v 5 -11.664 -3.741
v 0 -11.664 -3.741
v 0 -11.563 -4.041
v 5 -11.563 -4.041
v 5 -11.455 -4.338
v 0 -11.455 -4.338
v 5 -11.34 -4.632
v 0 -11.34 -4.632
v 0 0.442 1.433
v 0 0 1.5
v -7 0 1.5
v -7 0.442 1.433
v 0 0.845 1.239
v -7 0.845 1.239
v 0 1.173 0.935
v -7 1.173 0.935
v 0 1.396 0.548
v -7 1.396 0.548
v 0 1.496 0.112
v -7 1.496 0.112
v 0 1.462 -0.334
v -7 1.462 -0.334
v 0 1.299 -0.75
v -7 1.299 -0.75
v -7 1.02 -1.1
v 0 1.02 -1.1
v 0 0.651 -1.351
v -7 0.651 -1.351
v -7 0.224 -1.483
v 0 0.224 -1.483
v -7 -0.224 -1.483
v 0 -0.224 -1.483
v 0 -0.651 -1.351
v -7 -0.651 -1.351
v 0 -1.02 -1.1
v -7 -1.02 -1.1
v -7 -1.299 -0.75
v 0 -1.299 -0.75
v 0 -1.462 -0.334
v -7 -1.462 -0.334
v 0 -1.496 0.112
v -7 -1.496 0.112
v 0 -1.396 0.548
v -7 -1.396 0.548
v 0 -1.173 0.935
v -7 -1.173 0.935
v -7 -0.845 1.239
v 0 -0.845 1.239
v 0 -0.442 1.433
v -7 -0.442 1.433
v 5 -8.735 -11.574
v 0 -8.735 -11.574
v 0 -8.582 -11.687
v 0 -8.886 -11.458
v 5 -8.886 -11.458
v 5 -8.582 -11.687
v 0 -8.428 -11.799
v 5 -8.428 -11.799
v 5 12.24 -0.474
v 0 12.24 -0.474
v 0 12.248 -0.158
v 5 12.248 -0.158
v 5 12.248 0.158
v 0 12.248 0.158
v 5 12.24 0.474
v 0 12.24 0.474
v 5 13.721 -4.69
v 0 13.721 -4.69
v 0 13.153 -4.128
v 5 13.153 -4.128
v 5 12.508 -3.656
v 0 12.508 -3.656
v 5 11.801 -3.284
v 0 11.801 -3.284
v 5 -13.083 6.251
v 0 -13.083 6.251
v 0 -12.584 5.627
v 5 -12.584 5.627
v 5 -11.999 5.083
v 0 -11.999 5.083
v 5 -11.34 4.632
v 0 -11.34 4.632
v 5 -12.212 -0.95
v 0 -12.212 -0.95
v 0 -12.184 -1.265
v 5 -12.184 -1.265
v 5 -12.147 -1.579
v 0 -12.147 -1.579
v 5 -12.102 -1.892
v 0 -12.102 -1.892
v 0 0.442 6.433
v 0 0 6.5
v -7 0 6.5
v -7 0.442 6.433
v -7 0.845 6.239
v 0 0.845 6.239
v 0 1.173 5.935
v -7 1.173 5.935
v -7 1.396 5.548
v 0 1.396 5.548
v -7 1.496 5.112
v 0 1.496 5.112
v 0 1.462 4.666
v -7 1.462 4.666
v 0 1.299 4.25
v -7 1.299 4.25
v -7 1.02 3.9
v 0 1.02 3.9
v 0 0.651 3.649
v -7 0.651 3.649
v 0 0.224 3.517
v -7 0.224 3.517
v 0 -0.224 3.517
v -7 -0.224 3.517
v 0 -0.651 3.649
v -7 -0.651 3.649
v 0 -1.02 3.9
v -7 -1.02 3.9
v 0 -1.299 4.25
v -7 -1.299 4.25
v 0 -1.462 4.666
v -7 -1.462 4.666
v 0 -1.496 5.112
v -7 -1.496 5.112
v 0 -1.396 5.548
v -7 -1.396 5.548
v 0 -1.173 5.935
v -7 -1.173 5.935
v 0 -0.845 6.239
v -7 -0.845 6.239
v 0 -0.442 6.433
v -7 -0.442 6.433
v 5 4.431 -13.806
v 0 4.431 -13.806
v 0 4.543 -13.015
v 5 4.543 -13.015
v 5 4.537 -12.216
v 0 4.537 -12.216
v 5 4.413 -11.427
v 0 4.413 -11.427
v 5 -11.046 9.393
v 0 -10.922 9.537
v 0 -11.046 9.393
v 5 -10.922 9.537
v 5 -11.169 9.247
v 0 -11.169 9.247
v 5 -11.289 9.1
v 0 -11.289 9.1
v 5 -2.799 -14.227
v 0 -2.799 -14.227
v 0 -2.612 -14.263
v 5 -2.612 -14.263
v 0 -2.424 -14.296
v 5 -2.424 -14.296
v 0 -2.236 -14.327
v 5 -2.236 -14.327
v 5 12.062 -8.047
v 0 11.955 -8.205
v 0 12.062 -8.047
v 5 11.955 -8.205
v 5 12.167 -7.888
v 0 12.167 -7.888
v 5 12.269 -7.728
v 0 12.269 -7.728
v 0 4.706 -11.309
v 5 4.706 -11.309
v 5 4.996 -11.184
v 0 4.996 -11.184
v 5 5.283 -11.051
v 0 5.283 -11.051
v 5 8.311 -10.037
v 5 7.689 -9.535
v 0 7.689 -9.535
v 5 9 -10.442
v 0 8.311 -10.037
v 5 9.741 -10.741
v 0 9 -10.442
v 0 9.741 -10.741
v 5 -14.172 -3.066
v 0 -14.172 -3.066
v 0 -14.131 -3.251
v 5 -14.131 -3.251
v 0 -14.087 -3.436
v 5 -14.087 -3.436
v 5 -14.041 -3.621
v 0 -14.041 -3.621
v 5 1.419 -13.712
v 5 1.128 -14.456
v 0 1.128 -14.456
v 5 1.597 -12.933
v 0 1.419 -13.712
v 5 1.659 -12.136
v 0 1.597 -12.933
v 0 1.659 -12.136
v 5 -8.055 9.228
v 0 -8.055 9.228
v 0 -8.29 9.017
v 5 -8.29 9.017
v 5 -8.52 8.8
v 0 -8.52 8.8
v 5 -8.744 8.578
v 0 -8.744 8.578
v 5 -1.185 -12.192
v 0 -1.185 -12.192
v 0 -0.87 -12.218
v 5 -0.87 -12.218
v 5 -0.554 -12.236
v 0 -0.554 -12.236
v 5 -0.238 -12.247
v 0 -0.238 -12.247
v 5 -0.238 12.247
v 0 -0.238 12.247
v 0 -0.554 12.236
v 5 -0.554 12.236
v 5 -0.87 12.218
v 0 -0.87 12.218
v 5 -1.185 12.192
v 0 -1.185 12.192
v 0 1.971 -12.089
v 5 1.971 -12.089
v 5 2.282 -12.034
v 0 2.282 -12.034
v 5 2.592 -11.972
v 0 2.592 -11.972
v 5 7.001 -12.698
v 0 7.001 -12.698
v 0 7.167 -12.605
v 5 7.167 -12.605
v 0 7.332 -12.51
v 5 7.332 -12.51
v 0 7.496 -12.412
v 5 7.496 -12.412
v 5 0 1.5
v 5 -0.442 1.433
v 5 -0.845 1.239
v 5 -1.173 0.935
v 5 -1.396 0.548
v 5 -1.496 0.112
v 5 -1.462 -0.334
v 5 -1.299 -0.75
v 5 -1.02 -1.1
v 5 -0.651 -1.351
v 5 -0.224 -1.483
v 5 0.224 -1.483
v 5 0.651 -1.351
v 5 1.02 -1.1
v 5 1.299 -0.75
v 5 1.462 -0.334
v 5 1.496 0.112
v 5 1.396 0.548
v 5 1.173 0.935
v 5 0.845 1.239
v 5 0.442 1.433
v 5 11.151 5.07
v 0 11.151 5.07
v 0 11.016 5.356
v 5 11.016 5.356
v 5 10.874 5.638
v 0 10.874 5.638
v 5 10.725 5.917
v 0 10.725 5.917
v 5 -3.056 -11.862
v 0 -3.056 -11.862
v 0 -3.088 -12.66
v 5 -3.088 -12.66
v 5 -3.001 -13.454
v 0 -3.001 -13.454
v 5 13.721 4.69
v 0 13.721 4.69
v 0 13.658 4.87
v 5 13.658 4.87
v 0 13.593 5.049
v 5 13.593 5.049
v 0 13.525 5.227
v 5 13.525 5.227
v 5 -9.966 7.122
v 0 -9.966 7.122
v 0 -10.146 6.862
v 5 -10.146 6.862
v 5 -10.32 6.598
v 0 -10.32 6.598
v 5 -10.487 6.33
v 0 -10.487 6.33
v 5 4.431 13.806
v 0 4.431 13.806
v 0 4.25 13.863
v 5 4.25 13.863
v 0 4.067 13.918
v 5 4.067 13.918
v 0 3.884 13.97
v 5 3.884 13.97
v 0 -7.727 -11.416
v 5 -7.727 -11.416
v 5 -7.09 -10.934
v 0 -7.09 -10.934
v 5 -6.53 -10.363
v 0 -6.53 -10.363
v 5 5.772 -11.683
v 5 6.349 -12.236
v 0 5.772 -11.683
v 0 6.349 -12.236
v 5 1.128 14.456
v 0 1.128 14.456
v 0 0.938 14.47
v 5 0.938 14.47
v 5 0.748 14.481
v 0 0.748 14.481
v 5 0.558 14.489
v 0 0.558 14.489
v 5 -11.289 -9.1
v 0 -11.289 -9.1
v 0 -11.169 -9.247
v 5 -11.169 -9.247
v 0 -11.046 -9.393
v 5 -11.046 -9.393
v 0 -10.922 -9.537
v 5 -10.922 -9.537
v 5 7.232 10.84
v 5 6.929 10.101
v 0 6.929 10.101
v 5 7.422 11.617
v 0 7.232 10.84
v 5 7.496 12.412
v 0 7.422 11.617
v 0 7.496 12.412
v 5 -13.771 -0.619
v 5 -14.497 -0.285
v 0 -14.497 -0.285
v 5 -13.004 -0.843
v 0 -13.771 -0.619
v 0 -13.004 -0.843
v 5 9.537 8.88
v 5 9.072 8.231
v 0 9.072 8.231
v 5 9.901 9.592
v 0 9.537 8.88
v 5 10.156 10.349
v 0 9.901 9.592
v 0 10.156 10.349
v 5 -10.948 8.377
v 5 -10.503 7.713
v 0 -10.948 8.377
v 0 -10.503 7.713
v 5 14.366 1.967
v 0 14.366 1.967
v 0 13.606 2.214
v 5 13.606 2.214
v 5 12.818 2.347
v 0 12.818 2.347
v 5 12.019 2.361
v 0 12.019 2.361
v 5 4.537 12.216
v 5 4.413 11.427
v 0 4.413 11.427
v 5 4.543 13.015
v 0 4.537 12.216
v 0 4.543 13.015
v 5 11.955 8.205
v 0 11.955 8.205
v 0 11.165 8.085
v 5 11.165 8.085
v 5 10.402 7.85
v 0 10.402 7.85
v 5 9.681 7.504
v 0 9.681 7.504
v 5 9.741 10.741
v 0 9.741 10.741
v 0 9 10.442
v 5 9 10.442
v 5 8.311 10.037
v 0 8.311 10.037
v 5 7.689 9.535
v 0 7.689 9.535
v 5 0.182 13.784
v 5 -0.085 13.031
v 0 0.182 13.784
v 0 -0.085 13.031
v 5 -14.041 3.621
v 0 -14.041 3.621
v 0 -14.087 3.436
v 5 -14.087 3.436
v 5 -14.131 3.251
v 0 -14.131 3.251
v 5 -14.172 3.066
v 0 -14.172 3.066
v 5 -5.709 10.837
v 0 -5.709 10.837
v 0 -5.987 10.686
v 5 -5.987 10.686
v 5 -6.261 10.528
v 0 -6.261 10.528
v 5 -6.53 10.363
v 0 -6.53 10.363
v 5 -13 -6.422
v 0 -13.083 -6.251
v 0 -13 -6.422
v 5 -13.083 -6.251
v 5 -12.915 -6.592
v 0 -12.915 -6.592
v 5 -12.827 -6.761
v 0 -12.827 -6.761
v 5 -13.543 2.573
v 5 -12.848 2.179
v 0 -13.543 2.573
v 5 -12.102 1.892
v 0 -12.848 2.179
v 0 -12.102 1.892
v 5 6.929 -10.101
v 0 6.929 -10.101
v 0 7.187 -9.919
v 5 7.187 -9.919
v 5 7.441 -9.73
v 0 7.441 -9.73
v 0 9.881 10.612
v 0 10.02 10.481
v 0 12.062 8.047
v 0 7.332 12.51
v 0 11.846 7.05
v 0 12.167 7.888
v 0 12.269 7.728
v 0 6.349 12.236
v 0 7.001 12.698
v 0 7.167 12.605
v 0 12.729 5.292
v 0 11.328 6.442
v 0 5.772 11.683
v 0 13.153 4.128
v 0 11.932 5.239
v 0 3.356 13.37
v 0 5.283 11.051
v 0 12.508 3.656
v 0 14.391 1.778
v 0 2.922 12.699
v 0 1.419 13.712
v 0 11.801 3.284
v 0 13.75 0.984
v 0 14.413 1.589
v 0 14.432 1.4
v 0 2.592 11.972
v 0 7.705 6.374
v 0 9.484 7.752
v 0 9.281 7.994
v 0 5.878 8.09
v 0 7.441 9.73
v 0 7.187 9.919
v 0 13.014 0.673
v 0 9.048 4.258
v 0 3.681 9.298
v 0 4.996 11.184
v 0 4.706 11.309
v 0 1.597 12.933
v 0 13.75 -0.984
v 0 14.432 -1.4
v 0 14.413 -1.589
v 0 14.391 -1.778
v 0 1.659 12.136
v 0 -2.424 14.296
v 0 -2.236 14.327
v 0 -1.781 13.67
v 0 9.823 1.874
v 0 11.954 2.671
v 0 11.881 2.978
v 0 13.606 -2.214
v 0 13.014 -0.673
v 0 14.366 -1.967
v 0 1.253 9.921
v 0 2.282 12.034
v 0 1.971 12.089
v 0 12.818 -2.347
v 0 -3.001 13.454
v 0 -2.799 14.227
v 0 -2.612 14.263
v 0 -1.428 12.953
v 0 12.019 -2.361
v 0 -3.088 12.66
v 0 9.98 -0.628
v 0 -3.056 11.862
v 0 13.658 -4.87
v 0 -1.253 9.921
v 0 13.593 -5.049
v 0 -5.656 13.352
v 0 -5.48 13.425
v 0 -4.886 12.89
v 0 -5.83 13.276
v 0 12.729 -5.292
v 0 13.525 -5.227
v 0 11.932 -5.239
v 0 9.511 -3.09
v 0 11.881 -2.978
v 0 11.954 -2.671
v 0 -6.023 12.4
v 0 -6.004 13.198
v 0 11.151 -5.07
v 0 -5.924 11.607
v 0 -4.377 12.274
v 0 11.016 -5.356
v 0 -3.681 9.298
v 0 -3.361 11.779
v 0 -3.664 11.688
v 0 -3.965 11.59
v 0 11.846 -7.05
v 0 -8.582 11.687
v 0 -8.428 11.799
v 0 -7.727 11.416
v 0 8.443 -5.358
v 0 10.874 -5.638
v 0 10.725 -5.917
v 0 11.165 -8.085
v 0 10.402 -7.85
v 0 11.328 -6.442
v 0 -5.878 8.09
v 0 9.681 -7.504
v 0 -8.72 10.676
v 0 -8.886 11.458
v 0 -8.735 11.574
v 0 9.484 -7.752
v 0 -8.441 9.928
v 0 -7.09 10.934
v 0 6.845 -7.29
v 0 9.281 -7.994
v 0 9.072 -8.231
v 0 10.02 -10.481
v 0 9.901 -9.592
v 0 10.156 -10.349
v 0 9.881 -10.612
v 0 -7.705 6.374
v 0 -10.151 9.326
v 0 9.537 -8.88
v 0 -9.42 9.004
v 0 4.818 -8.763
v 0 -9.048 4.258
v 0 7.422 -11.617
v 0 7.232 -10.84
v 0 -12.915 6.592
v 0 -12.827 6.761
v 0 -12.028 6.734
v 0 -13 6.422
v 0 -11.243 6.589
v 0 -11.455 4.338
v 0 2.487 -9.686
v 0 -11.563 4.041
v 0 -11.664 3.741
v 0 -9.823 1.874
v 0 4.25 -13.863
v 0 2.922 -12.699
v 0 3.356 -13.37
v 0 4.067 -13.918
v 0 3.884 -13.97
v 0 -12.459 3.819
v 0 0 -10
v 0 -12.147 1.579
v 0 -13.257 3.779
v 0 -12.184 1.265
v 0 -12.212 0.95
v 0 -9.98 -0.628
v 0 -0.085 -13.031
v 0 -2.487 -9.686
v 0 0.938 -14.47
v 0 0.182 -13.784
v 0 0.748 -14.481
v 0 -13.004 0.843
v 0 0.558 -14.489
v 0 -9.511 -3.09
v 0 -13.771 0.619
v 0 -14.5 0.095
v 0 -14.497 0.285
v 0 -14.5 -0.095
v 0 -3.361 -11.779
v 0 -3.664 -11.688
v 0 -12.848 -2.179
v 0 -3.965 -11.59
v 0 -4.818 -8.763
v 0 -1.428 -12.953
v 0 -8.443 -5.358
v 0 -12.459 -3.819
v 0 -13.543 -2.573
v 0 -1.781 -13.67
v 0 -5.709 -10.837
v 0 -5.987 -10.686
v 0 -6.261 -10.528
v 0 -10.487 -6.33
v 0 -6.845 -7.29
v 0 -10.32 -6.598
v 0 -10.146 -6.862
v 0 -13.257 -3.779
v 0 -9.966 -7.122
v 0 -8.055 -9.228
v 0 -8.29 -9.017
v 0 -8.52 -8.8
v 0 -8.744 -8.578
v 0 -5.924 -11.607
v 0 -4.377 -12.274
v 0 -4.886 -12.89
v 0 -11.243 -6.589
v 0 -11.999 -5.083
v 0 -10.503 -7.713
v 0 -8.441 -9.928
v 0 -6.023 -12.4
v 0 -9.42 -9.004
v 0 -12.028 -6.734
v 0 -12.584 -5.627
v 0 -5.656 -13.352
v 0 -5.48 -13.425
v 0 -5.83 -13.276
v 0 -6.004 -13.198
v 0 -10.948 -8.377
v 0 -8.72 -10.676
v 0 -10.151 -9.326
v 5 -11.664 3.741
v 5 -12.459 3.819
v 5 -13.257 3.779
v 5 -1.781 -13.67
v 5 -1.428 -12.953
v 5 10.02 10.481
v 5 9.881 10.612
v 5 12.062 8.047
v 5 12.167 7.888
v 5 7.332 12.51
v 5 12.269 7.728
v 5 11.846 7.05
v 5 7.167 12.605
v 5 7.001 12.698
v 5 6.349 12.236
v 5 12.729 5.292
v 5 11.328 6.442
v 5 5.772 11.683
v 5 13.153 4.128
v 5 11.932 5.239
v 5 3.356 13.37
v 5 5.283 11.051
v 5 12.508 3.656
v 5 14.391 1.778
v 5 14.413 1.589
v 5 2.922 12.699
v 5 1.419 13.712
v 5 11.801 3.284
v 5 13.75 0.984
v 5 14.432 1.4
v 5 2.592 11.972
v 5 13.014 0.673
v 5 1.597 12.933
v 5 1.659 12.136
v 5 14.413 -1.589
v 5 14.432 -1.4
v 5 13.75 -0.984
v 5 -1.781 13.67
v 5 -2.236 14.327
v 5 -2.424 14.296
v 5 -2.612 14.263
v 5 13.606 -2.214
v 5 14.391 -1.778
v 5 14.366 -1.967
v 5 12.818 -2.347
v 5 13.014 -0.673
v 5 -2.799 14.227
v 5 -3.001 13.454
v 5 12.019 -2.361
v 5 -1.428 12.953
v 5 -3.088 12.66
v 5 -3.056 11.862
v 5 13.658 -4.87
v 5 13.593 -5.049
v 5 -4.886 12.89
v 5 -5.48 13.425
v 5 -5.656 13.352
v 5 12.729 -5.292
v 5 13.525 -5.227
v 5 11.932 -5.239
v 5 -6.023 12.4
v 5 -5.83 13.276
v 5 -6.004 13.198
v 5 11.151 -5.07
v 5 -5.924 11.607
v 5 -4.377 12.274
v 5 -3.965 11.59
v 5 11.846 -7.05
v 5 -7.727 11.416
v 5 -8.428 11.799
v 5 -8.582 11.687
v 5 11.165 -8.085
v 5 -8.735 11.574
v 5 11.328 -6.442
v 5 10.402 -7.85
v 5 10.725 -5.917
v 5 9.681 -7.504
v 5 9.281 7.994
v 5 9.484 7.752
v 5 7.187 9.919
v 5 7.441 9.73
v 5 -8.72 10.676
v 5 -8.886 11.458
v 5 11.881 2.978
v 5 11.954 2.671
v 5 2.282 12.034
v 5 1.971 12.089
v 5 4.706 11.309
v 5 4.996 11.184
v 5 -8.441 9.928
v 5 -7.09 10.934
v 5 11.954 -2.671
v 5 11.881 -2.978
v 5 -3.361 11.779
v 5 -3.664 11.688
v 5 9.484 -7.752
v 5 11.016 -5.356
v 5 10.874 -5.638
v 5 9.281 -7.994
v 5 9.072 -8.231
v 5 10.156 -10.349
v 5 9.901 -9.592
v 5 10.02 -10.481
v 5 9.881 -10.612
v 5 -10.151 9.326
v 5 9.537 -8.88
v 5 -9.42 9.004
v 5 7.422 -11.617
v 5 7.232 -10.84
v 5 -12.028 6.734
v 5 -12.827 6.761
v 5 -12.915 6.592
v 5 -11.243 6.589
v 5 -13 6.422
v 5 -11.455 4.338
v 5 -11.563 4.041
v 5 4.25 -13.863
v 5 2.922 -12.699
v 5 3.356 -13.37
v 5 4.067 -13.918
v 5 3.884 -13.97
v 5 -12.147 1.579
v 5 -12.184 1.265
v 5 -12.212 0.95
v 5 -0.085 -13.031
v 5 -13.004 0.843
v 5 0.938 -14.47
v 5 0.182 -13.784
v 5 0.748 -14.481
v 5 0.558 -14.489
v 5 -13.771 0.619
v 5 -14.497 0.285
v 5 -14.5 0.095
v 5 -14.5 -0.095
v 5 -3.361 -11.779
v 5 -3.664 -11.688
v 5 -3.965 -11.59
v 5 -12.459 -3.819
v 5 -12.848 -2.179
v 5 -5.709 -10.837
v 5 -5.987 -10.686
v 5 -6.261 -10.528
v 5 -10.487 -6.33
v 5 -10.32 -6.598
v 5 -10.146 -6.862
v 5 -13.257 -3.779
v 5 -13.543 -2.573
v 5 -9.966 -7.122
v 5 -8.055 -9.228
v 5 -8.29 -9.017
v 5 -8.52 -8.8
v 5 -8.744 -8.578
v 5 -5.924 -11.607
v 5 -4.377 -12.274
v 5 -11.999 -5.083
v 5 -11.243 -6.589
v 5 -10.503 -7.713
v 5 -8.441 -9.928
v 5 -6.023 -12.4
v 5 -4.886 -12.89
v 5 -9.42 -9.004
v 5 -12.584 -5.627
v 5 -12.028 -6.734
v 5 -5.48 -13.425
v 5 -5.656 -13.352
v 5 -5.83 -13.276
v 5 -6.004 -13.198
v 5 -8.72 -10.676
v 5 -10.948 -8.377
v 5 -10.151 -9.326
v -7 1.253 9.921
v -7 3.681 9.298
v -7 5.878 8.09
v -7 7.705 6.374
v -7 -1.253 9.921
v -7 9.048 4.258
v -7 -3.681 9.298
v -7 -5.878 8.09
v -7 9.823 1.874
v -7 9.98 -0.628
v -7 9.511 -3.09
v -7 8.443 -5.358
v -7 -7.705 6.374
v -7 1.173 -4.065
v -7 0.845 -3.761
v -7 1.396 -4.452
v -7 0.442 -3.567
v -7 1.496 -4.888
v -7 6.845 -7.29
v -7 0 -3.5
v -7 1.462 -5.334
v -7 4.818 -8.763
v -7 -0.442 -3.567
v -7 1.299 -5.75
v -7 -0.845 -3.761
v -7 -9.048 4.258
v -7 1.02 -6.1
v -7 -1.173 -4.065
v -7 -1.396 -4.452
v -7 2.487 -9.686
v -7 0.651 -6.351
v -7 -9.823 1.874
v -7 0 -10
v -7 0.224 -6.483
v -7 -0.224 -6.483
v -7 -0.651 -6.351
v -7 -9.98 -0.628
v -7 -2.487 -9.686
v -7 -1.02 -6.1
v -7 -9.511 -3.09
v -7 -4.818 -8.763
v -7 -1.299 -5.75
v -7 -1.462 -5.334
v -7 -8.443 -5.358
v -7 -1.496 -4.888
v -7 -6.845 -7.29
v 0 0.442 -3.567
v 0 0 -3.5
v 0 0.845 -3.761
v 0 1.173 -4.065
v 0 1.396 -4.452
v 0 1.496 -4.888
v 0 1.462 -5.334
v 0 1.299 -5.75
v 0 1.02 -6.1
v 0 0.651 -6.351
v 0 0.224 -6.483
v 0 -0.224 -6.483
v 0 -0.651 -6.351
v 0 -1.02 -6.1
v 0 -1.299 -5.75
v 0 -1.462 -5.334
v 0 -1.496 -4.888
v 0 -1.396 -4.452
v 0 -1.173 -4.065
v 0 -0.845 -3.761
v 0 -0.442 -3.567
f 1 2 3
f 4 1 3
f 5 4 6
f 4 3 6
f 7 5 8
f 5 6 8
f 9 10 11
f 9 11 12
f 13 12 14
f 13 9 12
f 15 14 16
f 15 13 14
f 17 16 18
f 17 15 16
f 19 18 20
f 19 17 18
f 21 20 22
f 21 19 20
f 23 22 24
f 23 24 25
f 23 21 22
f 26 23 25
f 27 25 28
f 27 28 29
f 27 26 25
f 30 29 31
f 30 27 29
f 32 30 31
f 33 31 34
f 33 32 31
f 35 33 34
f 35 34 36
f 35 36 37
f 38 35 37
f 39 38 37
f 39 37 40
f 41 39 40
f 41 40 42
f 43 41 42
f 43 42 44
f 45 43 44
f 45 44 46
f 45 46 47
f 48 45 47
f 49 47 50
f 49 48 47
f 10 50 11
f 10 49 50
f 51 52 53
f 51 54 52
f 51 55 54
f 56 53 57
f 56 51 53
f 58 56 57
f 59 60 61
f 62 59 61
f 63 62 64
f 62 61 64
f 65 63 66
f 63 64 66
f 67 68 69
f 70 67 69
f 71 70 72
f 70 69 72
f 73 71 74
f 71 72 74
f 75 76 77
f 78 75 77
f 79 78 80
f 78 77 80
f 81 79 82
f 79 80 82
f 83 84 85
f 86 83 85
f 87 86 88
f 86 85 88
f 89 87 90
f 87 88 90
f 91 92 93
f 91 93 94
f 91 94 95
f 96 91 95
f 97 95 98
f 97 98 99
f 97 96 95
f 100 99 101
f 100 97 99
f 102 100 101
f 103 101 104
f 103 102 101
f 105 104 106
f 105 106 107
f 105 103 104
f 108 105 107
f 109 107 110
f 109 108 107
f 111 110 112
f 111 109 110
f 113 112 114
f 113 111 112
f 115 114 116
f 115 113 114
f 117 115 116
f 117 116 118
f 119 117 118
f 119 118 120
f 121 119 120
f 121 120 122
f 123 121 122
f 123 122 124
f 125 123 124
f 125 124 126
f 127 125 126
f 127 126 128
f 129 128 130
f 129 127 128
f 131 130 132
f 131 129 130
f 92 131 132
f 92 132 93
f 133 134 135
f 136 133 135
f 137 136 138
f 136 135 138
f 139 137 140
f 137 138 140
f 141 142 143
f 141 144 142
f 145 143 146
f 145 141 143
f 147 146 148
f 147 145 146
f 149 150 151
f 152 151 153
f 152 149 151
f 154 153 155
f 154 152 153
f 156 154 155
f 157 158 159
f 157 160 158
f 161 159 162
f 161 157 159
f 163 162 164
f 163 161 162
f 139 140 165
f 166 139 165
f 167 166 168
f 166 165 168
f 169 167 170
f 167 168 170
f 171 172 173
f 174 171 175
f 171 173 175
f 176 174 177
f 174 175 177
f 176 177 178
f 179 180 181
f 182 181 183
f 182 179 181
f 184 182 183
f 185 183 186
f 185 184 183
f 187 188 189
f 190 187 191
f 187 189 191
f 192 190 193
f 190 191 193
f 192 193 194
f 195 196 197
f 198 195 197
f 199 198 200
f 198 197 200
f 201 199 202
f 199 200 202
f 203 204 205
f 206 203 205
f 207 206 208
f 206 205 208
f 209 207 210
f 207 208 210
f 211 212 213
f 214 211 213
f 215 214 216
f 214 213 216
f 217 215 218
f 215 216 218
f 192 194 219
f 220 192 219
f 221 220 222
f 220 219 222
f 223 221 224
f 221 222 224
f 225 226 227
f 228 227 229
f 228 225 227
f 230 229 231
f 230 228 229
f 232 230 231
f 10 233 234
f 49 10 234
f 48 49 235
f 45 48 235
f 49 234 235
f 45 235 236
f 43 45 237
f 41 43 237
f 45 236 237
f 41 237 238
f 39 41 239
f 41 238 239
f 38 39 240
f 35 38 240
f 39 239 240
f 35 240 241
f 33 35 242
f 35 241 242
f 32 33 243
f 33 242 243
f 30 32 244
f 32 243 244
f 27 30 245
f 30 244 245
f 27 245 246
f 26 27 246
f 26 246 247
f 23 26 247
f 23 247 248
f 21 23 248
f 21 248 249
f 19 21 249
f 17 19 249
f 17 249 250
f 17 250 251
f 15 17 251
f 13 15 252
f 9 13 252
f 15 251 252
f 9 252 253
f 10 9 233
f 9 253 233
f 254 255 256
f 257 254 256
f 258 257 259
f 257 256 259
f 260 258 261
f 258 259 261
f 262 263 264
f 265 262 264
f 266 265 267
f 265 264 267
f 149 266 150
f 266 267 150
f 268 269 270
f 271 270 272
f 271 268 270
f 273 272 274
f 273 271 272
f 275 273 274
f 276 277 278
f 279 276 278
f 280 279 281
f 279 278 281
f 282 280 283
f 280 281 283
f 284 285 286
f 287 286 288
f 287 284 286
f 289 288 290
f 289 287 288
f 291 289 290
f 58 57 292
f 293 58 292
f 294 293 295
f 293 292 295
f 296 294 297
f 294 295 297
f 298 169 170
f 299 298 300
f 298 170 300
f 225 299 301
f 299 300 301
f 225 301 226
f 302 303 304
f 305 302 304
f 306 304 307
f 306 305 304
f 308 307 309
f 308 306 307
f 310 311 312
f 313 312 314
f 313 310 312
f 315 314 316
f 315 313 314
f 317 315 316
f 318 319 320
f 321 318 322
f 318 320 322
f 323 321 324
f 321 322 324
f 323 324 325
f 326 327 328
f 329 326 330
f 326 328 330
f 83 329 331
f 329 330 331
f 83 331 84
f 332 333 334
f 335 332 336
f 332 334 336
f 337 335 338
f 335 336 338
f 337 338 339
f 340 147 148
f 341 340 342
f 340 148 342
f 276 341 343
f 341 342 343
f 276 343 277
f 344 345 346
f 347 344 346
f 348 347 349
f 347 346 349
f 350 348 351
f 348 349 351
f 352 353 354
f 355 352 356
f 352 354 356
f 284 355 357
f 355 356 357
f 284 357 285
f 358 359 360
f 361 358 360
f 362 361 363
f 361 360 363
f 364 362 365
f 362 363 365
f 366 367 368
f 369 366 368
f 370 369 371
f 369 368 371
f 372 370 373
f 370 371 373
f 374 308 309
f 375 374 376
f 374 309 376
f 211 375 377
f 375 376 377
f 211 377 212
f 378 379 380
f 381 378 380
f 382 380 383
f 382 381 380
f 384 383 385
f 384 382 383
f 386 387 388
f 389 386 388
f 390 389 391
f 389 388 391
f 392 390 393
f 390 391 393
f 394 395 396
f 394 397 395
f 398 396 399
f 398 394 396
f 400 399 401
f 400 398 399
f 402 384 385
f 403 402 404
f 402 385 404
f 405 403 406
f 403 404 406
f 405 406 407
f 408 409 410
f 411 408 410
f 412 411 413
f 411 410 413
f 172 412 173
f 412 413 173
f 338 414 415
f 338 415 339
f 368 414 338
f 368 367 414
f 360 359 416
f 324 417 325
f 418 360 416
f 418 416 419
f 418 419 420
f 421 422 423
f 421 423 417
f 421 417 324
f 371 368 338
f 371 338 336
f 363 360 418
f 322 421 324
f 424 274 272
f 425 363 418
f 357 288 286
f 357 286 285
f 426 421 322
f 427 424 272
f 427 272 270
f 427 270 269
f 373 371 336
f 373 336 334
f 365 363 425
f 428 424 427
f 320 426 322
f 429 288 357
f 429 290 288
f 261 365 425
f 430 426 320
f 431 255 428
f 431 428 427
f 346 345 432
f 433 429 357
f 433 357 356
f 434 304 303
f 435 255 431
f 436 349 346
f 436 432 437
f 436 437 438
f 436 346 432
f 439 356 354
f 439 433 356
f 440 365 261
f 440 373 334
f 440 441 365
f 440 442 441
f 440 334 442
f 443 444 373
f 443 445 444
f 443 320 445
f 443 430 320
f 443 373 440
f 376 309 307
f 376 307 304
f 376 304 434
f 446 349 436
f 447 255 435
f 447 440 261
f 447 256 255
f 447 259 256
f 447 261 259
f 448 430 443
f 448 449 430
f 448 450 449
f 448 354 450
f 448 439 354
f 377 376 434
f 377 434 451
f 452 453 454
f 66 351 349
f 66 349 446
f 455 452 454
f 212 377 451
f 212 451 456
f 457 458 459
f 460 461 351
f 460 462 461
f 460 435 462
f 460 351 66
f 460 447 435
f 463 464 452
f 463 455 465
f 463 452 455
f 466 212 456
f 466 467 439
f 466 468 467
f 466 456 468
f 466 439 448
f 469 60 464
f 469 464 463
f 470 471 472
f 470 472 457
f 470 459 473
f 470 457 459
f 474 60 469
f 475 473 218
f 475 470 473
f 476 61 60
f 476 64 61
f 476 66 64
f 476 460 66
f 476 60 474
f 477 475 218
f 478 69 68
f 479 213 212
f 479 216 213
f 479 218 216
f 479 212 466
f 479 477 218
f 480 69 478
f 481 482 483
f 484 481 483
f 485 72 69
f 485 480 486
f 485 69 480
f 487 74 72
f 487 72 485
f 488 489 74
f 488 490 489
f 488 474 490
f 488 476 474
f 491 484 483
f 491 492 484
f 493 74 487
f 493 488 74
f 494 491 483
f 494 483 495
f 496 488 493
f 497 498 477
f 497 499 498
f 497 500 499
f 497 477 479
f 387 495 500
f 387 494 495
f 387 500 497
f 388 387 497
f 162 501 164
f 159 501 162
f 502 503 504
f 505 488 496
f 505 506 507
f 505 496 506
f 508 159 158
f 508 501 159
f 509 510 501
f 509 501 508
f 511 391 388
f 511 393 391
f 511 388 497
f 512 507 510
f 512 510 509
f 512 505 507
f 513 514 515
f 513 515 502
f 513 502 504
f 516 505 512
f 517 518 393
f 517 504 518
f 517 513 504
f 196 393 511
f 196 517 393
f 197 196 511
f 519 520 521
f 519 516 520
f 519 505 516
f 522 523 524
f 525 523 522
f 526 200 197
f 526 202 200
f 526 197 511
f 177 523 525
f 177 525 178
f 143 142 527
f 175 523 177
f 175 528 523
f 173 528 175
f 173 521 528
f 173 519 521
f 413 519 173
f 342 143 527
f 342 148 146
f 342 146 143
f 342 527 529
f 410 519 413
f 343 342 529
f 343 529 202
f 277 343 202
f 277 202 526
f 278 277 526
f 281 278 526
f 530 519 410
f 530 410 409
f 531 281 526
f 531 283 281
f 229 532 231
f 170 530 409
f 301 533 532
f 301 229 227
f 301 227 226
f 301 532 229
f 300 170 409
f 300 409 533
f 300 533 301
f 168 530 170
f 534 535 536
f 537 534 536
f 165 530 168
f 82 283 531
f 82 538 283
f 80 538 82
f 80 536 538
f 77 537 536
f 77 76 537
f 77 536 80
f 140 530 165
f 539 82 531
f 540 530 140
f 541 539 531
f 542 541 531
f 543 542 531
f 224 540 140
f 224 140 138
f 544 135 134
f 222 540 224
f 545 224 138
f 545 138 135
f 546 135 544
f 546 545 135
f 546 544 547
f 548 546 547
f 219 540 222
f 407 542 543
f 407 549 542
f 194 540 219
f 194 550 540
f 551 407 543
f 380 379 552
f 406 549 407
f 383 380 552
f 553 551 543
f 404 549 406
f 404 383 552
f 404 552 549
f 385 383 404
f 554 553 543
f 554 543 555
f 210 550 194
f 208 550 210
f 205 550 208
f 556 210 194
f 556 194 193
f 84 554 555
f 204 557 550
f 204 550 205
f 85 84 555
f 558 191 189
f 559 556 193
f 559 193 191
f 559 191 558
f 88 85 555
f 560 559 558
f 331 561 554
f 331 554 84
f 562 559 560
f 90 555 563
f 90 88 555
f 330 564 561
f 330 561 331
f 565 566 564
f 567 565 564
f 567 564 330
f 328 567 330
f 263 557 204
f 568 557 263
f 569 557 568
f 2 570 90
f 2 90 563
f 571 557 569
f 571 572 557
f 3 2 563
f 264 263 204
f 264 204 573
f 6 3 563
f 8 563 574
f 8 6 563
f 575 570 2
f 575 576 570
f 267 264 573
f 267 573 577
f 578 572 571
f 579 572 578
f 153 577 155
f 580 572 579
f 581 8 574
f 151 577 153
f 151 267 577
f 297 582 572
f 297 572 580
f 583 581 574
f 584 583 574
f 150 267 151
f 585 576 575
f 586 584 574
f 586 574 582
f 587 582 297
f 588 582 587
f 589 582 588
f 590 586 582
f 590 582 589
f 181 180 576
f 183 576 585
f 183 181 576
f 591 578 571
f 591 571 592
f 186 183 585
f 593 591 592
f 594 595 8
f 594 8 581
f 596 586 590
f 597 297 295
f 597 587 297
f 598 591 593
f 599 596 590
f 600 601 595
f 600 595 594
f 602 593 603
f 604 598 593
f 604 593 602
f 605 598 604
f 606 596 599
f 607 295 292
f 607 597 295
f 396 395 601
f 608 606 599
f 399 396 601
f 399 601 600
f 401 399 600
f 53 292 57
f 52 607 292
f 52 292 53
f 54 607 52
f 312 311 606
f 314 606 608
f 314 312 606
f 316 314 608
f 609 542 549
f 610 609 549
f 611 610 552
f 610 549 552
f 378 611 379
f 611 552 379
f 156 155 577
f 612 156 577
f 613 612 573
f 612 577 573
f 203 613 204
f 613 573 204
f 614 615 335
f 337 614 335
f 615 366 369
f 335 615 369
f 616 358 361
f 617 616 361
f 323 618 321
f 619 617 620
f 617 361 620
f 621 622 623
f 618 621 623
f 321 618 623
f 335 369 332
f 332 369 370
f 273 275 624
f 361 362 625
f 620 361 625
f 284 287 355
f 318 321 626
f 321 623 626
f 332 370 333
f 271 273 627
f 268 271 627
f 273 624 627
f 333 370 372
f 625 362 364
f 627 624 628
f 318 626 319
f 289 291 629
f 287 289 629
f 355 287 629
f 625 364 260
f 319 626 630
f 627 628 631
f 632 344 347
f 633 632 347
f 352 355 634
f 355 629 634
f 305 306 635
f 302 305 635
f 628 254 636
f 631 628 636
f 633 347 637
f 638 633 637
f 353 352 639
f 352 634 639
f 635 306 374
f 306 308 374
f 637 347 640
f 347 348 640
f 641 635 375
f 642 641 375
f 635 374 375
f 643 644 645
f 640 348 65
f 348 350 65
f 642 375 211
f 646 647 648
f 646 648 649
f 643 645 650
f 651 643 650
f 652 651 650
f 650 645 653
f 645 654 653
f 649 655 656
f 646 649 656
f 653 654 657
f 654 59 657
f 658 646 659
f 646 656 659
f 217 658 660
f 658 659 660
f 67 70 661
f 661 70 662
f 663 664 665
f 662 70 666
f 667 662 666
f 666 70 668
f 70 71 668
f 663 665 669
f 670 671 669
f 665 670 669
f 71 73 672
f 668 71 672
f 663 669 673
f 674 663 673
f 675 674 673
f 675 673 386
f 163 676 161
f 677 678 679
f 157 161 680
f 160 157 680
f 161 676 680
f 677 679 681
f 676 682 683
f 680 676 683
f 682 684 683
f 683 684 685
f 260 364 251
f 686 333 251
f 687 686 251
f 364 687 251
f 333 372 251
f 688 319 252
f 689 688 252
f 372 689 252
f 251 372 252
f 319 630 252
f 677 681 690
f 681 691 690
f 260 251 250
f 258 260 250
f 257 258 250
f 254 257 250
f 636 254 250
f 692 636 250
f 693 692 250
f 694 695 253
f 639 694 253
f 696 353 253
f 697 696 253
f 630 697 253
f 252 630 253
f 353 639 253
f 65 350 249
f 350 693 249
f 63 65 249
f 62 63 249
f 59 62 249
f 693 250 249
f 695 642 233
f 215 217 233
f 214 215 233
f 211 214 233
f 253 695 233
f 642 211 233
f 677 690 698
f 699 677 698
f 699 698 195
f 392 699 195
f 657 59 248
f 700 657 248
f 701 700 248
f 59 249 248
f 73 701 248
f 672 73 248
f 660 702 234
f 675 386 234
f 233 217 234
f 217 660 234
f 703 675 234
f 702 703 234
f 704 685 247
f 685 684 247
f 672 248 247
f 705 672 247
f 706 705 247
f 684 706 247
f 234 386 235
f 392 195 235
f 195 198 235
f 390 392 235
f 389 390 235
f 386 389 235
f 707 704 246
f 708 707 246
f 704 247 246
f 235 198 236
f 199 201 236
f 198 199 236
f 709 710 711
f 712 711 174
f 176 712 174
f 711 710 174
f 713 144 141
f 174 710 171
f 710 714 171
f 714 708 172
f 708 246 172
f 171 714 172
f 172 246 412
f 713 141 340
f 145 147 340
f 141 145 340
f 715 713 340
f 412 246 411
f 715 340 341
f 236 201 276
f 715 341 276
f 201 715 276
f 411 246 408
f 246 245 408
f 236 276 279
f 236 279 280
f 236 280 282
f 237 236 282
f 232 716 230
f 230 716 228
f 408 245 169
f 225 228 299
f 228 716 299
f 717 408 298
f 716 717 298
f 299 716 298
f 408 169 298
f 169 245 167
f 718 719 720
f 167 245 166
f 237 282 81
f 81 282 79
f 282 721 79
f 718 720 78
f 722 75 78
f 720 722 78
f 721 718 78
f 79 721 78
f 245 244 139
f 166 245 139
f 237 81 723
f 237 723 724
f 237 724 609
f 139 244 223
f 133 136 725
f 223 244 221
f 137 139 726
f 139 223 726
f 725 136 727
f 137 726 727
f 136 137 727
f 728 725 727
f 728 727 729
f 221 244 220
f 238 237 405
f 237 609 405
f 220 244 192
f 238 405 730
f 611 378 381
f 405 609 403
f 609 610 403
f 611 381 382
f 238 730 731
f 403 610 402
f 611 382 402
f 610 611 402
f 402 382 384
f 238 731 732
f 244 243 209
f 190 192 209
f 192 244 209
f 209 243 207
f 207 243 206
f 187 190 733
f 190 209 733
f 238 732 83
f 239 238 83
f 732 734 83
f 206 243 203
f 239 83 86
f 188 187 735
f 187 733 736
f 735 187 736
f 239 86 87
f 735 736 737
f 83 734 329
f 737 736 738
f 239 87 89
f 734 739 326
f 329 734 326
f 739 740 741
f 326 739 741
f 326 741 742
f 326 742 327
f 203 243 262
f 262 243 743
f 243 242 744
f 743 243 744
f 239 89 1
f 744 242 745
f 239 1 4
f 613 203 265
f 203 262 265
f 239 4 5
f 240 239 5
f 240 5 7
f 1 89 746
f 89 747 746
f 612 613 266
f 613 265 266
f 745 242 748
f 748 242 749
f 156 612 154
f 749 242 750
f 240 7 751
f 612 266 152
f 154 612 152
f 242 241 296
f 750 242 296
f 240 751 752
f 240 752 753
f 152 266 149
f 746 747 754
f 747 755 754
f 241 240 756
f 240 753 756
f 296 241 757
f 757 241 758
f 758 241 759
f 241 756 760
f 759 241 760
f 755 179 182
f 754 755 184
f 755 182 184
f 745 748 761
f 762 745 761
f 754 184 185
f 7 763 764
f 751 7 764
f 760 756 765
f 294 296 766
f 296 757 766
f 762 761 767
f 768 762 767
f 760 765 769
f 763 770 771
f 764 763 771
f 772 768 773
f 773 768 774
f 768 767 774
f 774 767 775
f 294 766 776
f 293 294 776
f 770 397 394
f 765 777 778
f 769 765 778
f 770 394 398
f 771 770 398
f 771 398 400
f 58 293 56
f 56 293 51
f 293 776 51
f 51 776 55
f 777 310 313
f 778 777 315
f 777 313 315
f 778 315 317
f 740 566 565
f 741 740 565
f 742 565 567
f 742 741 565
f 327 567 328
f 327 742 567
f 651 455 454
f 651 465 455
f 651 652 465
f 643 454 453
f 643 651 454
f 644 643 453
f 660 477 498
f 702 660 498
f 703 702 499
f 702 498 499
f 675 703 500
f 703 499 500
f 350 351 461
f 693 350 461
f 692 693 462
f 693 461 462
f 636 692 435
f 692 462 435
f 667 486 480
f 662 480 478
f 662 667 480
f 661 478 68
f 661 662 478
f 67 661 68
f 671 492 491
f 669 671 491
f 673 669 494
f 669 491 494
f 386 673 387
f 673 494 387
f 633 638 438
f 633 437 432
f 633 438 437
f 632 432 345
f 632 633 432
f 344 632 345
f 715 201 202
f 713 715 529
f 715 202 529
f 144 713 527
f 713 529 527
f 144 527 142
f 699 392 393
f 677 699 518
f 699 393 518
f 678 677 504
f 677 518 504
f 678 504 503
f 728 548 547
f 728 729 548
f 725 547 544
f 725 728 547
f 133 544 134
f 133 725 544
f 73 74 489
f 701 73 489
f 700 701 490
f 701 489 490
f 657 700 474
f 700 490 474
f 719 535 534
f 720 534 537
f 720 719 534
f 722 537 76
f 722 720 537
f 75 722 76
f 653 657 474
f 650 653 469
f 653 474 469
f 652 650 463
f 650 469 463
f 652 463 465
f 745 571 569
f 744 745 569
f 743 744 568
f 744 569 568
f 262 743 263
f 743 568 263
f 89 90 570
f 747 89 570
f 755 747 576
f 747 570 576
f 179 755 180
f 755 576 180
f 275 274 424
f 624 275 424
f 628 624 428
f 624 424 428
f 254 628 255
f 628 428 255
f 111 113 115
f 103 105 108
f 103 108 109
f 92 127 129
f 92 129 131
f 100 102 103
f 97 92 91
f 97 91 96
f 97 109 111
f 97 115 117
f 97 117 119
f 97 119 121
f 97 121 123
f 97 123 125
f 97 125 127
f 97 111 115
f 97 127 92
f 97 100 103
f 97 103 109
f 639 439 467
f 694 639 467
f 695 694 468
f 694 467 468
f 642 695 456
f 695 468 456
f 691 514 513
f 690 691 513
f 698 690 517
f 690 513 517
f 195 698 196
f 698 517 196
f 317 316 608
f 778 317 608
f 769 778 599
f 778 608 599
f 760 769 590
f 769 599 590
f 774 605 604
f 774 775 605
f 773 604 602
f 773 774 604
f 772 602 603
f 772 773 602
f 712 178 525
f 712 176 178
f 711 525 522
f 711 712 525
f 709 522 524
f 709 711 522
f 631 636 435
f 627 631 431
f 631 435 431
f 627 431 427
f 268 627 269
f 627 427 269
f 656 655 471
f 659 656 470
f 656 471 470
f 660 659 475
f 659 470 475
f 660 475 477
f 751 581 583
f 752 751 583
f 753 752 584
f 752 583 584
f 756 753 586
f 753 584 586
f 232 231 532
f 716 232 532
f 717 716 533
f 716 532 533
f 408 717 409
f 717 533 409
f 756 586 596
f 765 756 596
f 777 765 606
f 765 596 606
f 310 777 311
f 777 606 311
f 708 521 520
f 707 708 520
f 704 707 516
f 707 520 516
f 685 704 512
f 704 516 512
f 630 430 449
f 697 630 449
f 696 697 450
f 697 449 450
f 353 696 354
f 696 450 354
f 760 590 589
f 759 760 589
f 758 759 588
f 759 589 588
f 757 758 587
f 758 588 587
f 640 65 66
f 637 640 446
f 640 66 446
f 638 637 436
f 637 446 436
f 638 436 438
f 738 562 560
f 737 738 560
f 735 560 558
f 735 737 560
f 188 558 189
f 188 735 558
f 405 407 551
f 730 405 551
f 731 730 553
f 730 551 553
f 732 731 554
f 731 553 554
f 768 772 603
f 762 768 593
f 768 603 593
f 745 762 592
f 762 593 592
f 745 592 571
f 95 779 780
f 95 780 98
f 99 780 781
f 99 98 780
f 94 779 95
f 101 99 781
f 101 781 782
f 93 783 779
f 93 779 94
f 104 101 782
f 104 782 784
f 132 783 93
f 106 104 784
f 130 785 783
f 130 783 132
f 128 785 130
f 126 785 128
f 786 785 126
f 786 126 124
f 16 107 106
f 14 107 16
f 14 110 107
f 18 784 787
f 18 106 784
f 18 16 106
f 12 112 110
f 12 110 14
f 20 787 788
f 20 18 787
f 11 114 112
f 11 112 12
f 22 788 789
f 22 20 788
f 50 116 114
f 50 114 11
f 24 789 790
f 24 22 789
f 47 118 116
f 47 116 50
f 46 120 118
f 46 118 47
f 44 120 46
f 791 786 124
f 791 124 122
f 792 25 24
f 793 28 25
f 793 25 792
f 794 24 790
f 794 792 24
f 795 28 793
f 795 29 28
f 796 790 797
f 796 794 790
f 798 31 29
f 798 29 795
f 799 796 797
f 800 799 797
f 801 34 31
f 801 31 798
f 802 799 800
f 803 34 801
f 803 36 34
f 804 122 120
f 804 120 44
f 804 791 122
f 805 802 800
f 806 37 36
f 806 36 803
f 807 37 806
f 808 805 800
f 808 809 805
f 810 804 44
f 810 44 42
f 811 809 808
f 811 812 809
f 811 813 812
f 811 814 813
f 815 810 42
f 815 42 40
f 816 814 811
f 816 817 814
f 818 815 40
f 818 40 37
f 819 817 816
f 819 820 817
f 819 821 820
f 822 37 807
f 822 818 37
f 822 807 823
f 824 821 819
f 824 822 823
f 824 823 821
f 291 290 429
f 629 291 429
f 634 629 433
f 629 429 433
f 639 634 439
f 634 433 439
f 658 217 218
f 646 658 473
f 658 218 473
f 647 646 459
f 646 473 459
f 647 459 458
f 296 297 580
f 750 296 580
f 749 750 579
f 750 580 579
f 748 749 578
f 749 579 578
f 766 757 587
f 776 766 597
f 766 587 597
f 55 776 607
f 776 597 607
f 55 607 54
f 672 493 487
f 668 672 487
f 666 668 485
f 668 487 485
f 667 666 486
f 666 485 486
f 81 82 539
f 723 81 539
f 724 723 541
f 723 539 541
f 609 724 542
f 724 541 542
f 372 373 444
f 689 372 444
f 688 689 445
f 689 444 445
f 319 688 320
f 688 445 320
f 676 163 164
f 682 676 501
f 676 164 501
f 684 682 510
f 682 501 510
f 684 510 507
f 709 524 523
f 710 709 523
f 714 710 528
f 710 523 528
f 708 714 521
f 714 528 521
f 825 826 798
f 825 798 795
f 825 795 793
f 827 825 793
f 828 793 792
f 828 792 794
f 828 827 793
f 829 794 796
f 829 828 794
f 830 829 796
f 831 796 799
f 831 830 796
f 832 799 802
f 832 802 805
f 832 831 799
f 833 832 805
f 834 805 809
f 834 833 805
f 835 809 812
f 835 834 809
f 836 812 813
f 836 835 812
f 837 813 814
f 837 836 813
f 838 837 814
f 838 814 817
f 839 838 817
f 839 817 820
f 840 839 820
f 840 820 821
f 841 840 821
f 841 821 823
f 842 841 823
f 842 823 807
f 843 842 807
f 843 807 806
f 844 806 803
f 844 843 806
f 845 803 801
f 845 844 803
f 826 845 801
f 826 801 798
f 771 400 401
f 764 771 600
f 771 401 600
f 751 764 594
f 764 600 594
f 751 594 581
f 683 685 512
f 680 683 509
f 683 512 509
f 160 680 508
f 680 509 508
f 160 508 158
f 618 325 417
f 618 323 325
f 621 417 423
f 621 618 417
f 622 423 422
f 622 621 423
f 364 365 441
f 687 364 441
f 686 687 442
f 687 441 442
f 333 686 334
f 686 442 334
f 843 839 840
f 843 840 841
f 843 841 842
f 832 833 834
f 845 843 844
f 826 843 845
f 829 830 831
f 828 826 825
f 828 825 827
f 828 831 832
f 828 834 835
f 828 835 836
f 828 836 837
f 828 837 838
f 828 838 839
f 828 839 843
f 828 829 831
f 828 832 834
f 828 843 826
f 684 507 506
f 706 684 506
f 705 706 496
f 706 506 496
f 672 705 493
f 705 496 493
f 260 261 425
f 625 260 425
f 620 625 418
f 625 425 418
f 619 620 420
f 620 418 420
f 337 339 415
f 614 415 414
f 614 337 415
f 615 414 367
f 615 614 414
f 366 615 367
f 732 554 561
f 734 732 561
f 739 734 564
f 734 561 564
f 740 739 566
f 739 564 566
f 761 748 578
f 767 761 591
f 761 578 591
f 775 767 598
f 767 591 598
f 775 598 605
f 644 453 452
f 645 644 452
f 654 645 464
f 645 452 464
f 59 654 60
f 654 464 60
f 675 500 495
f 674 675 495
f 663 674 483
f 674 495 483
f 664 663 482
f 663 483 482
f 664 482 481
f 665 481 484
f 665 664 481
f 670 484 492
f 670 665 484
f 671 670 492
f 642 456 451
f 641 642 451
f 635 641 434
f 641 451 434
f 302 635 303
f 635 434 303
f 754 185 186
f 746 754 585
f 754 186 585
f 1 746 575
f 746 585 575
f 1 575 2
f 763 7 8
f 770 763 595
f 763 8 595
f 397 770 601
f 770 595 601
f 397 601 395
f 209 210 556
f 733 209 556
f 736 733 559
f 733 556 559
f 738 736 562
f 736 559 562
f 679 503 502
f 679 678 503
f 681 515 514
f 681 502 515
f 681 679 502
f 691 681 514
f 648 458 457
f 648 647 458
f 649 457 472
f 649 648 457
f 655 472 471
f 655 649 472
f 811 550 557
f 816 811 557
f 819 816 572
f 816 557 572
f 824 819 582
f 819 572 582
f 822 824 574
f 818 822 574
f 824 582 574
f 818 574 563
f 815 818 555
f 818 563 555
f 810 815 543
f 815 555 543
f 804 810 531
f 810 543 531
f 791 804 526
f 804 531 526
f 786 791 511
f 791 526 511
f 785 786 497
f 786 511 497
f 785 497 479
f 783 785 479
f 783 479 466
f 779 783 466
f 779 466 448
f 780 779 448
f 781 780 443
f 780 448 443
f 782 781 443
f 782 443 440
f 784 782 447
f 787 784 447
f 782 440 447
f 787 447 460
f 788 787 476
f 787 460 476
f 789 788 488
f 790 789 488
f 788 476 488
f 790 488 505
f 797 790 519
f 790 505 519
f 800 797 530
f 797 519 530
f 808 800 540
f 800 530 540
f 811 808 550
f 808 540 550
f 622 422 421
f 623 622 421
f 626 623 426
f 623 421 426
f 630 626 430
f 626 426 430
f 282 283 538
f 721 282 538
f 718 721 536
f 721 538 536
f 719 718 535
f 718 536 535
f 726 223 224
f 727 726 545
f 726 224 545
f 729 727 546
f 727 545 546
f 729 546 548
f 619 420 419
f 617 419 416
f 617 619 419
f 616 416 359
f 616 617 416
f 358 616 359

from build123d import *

# Parameters (mm, degrees)
BASPROSKE_W         = 5
BASPROSKE_H         = 14.5
TOOTHCUT_DEPTH      = 22.106870919
TEETHCUTS_COUNT     = 27
TEETHCUTS_ANGLE     = 346.666666667
BORSKE_R            = 1.5
BORE_DEPTH          = 50.0000508
SKETCH2_R           = 10
BOSS_EXTRUDE1_DEPTH = 7
CUT_EXTRUDE3_START  = -7
SKETCH3_R           = 1.5
CUT_EXTRUDE3_DEPTH  = 7


with BuildPart() as part:
    # BasProSke → Base-Revolve (revolve)
    with BuildSketch(Plane(origin=(0, 0, 0), x_dir=(1, 0, 0), z_dir=(0, 1, 0)), mode=Mode.PRIVATE) as base_revolve_sk:
        with Locations((2.5, 7.25)):
            Rectangle(BASPROSKE_W, BASPROSKE_H)
    revolve(base_revolve_sk.sketch.rotate(Axis((-10, 0, 0), (1, 0, 0)), 180), axis=Axis((-10, 0, 0), (1, 0, 0)))

    # TooCutSke → ToothCut (cut, through all)
    with BuildSketch(Plane(origin=(0, 0, 0), x_dir=(0, 0, -1), z_dir=(1, 0, 0))):
        with BuildLine():
            ThreePointArc((0.474054864, 12.239823242), (0, 12.249), (-0.474054864, 12.239823242))
            ThreePointArc((-0.474054864, 12.239823242), (-0.820231692, 13.40120918), (-1.416685779, 14.456149092))
            ThreePointArc((-1.416685779, 14.456149092), (0, 14.5254), (1.416685779, 14.456149092))
            ThreePointArc((1.416685779, 14.456149092), (0.820231692, 13.40120918), (0.474054864, 12.239823242))
        make_face()
    toothcut = extrude(amount=TOOTHCUT_DEPTH, mode=Mode.SUBTRACT)

    # TeethCuts: ToothCut ×27 about axis
    teethcuts_axis = Axis((-10, 0, 0), (1, 0, 0))
    for i in range(1, TEETHCUTS_COUNT):
        add(toothcut.rotate(teethcuts_axis, i * TEETHCUTS_ANGLE / (TEETHCUTS_COUNT - 1)), mode=Mode.SUBTRACT)

    # BorSke → Bore (cut, symmetric)
    with BuildSketch(Plane(origin=(0, 0, 0), x_dir=(0, 0, -1), z_dir=(1, 0, 0))):
        with Locations(Location((0, 0, 0), (0, 0, 180))):
            Circle(BORSKE_R)
    extrude(amount=BORE_DEPTH, both=True, mode=Mode.SUBTRACT)

    # Sketch2 → Boss-Extrude1 (add)
    with BuildSketch(Plane.ZY):
        with Locations(Location((0, 0, 0), (0, 0, 180))):
            Circle(SKETCH2_R)
    extrude(amount=BOSS_EXTRUDE1_DEPTH)

    # Sketch3 → Cut-Extrude3 (cut)
    with BuildSketch(Plane.ZY.offset(7).offset(CUT_EXTRUDE3_START)):
        Circle(SKETCH3_R)
        with Locations((5, 0)):
            Circle(SKETCH3_R)
        with Locations((-5, 0)):
            Circle(SKETCH3_R)
    extrude(amount=CUT_EXTRUDE3_DEPTH, mode=Mode.SUBTRACT)


solid = part.part
